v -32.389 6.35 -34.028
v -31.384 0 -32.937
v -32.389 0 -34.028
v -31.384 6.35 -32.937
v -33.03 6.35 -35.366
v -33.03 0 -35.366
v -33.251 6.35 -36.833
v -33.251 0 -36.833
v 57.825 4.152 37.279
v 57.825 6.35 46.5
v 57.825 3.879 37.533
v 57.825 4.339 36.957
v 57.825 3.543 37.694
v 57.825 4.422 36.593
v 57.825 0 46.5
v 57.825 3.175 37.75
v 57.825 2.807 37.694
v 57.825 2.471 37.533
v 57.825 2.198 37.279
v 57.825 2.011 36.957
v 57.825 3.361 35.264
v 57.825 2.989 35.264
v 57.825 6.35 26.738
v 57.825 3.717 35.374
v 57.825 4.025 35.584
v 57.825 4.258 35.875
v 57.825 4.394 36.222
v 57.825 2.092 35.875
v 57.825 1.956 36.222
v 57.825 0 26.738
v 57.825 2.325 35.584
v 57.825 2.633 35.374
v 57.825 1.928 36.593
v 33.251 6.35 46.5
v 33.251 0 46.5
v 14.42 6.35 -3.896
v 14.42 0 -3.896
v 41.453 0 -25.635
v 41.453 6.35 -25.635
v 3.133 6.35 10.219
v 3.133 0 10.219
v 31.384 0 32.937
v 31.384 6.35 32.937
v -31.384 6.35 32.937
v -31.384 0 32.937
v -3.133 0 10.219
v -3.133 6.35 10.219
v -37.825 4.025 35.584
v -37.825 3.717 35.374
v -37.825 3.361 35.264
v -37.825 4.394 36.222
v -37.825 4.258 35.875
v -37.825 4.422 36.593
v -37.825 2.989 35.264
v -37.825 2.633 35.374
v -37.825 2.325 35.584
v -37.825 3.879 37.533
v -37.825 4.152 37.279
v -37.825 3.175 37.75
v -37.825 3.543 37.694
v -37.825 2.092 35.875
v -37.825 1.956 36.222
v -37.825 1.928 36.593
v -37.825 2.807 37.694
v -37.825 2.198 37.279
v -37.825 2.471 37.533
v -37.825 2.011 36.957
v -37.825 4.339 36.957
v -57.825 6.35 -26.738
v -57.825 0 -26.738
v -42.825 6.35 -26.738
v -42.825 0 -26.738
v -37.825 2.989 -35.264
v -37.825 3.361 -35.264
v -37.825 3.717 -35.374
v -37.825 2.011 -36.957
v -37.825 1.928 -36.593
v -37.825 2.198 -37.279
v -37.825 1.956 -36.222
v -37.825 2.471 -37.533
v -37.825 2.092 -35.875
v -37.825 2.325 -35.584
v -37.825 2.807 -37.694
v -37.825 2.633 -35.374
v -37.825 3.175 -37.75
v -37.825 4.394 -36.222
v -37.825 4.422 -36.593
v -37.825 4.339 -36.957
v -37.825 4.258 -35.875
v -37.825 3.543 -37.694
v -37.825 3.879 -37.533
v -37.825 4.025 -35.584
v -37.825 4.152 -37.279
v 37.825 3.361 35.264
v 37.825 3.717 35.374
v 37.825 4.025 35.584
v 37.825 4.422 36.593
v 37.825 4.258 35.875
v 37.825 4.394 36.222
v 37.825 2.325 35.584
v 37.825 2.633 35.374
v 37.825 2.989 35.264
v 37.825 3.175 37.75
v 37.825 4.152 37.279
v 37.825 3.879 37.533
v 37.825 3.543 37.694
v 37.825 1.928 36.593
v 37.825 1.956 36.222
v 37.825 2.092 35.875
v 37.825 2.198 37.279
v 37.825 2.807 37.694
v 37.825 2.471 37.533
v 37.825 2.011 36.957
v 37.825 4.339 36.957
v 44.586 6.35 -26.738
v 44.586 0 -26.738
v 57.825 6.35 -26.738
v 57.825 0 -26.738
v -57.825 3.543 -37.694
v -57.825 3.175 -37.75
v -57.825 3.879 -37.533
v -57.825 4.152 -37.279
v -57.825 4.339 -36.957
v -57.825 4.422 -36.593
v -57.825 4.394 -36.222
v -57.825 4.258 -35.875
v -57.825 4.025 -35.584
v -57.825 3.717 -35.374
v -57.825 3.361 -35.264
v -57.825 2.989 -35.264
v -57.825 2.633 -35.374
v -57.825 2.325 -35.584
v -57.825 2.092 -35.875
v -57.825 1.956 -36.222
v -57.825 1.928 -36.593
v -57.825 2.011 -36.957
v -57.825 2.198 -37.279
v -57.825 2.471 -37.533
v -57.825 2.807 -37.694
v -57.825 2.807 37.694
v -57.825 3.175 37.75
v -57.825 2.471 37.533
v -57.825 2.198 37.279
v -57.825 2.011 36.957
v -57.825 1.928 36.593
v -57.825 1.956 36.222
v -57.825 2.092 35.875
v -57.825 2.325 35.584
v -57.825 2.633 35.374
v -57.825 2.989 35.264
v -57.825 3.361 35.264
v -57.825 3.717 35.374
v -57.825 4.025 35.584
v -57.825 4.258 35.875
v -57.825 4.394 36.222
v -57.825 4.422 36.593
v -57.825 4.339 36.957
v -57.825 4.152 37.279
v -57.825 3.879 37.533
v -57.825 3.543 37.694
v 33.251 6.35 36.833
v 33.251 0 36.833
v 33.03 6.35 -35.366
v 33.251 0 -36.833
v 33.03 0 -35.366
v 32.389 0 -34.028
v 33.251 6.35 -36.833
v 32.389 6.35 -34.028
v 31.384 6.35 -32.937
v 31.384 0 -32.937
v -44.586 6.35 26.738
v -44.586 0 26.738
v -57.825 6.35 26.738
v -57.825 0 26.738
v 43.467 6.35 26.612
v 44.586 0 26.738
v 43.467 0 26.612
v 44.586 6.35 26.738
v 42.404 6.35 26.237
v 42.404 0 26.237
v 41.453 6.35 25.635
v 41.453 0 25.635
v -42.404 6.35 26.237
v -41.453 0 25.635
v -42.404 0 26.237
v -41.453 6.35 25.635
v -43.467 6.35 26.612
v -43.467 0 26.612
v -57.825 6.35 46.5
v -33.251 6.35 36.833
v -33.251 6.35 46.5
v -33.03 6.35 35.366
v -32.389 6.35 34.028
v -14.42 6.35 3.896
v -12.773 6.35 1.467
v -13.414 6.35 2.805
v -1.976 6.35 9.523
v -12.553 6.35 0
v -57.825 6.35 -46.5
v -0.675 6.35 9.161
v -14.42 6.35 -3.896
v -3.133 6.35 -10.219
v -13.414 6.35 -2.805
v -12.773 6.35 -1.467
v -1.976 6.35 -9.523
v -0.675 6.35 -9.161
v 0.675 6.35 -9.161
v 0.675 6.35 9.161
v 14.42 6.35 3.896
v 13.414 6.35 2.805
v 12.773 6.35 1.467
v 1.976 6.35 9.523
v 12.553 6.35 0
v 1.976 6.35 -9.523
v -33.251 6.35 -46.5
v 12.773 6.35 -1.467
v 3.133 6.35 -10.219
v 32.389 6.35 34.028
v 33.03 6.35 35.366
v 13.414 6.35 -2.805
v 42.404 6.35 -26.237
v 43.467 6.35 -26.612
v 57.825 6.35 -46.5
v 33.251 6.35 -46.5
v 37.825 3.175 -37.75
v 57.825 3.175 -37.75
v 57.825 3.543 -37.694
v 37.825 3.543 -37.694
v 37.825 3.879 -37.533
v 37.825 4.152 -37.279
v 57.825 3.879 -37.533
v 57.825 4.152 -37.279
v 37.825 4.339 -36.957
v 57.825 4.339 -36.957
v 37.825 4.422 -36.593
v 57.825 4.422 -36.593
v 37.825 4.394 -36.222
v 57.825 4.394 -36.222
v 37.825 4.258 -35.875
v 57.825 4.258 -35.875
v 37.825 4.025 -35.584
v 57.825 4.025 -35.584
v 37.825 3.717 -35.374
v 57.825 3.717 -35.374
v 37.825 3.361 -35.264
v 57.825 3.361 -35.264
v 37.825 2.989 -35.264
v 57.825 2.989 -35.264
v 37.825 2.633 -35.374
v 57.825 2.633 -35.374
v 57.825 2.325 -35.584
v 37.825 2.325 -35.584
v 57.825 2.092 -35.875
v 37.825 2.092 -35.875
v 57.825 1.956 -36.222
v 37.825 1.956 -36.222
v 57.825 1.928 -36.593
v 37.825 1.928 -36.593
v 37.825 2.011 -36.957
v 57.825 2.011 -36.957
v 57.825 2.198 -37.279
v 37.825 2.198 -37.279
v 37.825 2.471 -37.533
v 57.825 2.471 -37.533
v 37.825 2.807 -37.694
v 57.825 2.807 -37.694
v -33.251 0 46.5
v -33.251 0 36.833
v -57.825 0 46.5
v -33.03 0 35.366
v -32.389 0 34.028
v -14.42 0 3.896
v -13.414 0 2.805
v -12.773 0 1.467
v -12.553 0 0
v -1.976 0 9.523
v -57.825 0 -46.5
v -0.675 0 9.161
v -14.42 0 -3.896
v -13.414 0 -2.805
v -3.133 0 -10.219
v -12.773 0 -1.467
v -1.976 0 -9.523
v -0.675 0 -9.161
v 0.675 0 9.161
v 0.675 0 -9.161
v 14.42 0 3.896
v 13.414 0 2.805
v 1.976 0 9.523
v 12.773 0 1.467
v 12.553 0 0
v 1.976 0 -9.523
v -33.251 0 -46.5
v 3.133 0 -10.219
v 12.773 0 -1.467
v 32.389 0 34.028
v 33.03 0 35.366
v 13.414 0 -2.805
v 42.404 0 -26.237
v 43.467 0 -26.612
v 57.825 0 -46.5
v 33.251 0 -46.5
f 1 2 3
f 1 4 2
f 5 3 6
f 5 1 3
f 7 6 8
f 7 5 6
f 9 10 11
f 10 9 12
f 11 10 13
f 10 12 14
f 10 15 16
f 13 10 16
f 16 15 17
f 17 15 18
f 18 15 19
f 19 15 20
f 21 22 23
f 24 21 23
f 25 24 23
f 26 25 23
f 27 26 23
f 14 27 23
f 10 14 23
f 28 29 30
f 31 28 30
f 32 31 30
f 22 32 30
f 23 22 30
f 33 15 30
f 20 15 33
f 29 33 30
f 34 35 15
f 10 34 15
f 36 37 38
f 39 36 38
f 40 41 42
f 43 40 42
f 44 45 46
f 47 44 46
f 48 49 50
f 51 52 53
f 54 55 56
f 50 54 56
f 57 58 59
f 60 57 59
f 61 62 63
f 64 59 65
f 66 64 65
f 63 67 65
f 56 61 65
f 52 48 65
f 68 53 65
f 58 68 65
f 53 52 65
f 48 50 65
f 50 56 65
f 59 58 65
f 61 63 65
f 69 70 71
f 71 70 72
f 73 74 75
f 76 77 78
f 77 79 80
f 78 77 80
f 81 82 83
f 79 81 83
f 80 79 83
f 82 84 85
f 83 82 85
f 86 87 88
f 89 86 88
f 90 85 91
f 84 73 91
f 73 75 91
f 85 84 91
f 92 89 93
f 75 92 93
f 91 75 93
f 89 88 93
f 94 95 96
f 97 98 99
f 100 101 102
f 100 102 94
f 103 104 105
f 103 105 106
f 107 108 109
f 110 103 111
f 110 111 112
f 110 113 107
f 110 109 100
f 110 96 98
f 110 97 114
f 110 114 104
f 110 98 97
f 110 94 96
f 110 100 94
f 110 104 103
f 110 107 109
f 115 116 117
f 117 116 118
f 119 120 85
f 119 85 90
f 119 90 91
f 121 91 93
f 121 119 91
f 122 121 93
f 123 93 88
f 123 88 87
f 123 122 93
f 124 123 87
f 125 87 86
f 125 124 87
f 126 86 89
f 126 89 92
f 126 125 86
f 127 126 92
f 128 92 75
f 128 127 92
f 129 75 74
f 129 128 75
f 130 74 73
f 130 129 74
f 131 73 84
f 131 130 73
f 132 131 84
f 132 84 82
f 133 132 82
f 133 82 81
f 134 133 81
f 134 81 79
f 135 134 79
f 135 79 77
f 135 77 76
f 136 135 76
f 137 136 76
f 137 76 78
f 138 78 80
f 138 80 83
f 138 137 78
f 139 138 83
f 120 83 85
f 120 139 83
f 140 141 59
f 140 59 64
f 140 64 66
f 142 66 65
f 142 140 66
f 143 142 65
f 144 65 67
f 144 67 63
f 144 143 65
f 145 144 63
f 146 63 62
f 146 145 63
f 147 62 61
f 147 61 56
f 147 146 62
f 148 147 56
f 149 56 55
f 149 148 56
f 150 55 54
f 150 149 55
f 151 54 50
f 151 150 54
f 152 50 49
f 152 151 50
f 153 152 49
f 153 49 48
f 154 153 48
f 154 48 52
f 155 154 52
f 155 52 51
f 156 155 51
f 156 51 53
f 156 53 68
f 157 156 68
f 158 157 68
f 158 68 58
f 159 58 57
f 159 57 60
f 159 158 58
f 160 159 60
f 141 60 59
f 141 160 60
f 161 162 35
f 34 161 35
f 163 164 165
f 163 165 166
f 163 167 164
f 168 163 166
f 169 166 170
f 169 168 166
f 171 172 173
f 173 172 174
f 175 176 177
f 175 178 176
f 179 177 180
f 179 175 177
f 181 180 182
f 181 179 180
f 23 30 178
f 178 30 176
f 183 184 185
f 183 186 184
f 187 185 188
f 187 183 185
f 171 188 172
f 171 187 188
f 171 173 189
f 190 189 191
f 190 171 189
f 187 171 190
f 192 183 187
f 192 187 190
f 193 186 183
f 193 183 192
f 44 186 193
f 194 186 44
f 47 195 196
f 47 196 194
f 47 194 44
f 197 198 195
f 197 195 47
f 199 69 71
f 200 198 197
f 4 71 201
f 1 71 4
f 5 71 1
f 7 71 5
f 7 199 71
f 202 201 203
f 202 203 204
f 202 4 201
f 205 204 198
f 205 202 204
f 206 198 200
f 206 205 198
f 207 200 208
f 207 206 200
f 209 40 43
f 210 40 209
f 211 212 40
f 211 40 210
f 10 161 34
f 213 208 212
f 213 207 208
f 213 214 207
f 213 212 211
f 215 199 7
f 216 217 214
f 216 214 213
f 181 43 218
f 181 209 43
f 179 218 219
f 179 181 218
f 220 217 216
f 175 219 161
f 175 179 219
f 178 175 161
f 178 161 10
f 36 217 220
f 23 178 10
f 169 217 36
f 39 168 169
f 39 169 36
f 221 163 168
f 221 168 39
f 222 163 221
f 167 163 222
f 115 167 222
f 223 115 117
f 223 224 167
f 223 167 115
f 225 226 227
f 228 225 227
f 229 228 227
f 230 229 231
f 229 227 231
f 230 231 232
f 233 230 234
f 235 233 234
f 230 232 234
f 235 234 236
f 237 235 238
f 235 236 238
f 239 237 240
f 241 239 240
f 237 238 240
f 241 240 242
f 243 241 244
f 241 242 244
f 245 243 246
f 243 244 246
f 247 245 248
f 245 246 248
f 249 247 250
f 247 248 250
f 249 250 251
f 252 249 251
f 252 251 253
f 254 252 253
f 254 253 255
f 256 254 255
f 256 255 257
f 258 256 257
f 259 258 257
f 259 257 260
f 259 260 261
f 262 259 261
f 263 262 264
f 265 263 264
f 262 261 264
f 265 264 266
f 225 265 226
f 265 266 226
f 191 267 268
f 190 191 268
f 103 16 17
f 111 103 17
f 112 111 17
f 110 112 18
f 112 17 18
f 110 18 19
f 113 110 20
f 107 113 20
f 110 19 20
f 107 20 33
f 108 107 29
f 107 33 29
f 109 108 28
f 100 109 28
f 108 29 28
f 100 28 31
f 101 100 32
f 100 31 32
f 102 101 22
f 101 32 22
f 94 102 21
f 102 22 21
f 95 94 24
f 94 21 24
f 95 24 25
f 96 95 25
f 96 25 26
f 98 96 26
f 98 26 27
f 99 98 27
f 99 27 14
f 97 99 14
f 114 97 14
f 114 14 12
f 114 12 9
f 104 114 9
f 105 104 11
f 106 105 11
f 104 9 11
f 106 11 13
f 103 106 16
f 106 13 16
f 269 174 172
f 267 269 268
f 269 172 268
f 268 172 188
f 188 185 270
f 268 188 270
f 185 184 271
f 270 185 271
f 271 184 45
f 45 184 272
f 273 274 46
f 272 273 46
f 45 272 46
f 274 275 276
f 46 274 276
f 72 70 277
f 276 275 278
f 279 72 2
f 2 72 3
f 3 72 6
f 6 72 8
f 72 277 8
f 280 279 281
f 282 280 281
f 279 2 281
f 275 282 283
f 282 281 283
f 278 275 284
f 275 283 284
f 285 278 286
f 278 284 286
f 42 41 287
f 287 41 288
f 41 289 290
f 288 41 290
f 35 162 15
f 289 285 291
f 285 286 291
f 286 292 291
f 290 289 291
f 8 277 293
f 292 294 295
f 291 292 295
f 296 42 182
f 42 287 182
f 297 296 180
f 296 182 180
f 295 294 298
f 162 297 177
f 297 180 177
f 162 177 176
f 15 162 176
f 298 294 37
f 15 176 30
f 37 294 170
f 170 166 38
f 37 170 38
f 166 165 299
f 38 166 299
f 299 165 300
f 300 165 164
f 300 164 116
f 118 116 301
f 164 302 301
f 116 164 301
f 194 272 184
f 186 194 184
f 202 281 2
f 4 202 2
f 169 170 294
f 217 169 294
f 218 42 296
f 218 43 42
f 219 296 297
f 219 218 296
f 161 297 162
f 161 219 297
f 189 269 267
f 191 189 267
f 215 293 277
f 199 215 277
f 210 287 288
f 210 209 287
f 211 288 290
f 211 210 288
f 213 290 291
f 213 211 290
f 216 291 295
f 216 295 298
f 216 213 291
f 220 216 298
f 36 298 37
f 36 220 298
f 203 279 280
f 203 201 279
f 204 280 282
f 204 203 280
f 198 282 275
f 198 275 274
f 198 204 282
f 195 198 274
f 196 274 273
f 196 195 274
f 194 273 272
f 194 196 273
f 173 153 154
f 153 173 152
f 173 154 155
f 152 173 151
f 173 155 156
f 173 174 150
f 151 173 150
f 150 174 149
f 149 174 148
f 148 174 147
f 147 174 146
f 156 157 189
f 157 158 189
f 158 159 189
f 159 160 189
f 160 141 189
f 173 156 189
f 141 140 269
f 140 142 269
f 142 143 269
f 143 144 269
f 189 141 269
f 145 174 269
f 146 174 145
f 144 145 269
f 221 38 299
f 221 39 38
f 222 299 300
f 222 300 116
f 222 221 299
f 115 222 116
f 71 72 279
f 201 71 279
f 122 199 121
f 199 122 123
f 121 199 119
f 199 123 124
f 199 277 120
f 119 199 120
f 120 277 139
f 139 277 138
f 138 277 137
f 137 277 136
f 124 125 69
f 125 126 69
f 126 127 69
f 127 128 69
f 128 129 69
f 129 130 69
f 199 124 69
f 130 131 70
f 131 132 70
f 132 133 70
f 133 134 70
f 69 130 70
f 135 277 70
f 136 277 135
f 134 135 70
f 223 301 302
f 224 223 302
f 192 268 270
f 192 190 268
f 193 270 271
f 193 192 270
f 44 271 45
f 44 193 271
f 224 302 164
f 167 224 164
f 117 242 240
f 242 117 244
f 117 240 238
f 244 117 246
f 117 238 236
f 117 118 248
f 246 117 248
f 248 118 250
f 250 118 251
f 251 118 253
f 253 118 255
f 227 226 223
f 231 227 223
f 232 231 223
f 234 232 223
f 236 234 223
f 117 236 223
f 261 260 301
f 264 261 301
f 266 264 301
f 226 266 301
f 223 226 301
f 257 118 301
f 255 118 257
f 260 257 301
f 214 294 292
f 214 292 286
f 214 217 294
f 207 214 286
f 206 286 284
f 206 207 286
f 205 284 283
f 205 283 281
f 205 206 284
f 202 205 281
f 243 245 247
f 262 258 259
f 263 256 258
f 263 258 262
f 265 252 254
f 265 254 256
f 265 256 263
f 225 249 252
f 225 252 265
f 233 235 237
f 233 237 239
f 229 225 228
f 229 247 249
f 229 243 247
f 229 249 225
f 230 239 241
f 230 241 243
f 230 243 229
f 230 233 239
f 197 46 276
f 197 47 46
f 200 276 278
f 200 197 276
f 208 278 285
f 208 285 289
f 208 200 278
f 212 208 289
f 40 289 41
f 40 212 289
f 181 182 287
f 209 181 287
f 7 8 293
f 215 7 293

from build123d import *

# Parameters (mm, degrees)
BOSS_EXTRUDE1_DEPTH = 6.35
FILLET1_R           = 5
SKETCH2_R           = 1.25
CUT_EXTRUDE1_DEPTH  = 20


with BuildPart() as part:
    # Sketch1 → Boss-Extrude1 (new body)
    with BuildSketch(Plane(origin=(0, 0, 0), x_dir=(1, 0, 0), z_dir=(0, 1, 0))):
        Polygon((-57.825, 26.738412941), (-42.825, 26.738412941), (-9.574489714, 0), (-42.825, -26.738412941), (-57.825, -26.738412941), (-57.825, -46.5), (-33.250510286, -46.5), (-33.250510286, -34.437743191), (0, -7.69933025), (33.250510286, -34.437743191), (33.250510286, -46.5), (57.825, -46.5), (57.825, -26.738412941), (42.825, -26.738412941), (9.574489714, 0), (42.825, 26.738412941), (57.825, 26.738412941), (57.825, 46.5), (33.250510286, 46.5), (33.250510286, 34.437743191), (0, 7.69933025), (-33.250510286, 34.437743191), (-33.250510286, 46.5), (-57.825, 46.5), align=None)
    extrude(amount=BOSS_EXTRUDE1_DEPTH)

    # Fillet1
    fillet1_edges = [part.edges().sort_by_distance(p)[0] for p in [
        (-33.250510286, 3.175, -34.437743191),
        (0, 3.175, -7.69933025),
        (33.250510286, 3.175, -34.437743191),
        (42.825, 3.175, -26.738412941),
        (9.574489714, 3.175, 0),
        (42.825, 3.175, 26.738412941),
        (33.250510286, 3.175, 34.437743191),
        (0, 3.175, 7.69933025),
        (-33.250510286, 3.175, 34.437743191),
        (-42.825, 3.175, 26.738412941),
        (-9.574489714, 3.175, 0),
    ]]
    fillet(fillet1_edges, radius=FILLET1_R)

    # Sketch2 → Cut-Extrude1 (cut)
    with BuildSketch(Plane(origin=(57.825, 0, 0), x_dir=(0, 0, -1), z_dir=(1, 0, 0))):
        with Locations((36.5, 3.175)):
            Circle(SKETCH2_R)
        with Locations(Location((-36.5, 3.175, 0), (0, 0, 180))):
            Circle(SKETCH2_R)
    cut_extrude1 = extrude(amount=-CUT_EXTRUDE1_DEPTH, mode=Mode.SUBTRACT)

    # Mirror1: Cut-Extrude1 across plane
    add(cut_extrude1.mirror(Plane(origin=(0, 0, 0), x_dir=(0, 0, 1), z_dir=(1, 0, 0))), mode=Mode.SUBTRACT)


solid = part.part
